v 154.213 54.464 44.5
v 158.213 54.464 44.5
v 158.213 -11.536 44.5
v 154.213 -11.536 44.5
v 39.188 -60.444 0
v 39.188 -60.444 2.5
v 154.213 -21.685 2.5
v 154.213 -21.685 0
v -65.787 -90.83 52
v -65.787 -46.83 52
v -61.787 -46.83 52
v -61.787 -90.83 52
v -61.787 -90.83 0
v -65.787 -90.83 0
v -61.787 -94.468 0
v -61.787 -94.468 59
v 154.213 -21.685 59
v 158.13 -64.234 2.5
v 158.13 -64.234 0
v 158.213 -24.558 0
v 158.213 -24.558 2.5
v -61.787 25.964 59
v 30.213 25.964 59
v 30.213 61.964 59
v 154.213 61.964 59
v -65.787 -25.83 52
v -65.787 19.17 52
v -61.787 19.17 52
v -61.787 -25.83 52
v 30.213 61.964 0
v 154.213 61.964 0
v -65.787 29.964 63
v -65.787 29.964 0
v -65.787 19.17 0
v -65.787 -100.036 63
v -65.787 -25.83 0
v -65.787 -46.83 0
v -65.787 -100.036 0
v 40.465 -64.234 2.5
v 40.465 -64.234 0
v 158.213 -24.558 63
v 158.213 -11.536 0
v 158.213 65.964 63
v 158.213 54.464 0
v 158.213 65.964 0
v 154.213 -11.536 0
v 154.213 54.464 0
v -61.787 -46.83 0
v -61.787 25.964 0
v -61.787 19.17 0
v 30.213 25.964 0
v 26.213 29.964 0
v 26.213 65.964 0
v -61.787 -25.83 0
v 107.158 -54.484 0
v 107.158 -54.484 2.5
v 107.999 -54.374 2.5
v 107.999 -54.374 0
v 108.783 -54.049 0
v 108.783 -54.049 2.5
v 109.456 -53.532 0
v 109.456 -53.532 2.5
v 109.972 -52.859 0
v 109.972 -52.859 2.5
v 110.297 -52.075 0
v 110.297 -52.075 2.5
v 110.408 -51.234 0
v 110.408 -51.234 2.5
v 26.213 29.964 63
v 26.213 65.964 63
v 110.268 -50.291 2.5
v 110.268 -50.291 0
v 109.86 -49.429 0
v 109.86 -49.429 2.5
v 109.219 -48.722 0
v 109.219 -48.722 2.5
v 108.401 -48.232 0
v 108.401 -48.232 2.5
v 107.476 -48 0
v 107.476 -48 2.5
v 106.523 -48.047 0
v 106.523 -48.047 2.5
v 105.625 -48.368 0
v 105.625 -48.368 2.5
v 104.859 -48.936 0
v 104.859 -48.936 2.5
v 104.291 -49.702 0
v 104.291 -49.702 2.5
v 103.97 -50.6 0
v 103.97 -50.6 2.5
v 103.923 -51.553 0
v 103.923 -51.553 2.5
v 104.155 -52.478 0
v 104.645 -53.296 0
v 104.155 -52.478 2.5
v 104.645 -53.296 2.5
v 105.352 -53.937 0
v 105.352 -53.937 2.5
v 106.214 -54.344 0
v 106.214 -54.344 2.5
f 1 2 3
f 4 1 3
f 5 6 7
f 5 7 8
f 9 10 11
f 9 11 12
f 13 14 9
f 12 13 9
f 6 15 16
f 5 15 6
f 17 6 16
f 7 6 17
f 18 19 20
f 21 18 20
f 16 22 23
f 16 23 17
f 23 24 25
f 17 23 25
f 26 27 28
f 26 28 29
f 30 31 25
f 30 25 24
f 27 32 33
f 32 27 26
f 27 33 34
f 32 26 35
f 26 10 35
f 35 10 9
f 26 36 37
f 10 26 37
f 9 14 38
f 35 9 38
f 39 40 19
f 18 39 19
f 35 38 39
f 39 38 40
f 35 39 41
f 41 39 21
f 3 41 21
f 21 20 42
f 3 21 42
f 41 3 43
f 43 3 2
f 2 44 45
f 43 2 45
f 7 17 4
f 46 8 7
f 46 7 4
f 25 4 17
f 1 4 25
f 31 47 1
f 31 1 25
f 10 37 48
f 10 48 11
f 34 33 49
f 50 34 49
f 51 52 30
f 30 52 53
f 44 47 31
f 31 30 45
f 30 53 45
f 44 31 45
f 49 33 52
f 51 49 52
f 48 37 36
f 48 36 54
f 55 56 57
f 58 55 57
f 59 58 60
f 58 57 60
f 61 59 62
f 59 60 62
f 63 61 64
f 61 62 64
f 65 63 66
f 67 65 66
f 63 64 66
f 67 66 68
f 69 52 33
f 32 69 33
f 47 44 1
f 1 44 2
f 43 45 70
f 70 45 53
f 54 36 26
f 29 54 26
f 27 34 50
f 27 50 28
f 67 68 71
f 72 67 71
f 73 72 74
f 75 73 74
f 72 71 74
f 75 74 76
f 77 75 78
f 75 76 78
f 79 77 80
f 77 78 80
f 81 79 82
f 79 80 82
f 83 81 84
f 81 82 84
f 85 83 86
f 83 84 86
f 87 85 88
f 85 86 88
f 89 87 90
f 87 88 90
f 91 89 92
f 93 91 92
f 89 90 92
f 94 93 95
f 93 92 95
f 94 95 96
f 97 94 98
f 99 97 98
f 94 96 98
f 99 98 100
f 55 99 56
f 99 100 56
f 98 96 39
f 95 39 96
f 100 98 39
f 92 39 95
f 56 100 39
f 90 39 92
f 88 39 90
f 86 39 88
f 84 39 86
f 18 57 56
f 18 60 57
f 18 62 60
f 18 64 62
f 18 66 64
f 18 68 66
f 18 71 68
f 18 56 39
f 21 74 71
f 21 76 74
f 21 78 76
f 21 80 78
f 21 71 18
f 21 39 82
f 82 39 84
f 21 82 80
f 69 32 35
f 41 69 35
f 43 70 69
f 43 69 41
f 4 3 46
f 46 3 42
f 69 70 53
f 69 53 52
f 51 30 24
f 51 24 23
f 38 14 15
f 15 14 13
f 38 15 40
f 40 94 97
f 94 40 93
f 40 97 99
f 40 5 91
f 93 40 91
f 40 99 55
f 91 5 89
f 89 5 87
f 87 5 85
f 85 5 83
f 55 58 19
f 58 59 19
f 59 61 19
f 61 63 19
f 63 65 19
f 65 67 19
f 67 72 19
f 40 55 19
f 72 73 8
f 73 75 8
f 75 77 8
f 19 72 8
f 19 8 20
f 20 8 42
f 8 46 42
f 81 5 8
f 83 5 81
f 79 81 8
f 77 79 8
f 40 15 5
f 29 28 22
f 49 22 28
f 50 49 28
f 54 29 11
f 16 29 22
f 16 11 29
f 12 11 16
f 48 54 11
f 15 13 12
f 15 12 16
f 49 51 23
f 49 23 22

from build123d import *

# Parameters (mm, degrees)
F1_DEPTH    = 63
F2_DEPTH    = 2.5
F3_T        = 4
F3_T3_DEPTH = 132.2533825366
F3_T5_DEPTH = 10.5
F3_T7_DEPTH = 71
F4_W        = 44
F4_H        = 52
F4_W_2      = 45
F5_DEPTH    = 4.5
F7_DEPTH    = 5
F9_DEPTH    = 25


# Not quite as in the source:
# - a shell that OpenCascade refuses in one call is made with other operations: the cavity is built on its own and cut out


with BuildPart() as f1:
    # F0 (on Top) → F1 (new body)
    with BuildSketch(Plane.XY):
        Polygon((26.2132732272, -24.0364130735), (26.2132732272, 29.9635869265), (-65.7867267728, 29.9635869265), (-65.7867267728, -100.0364130735), (26.2132732272, -69.0364130735), align=None)
        Polygon((158.2132732272, 65.9635869265), (26.2132732272, 65.9635869265), (26.2132732272, 29.9635869265), (26.2132732272, -24.0364130735), (26.2132732272, -69.0364130735), (40.4647773284, -64.234275822), (158.2132732272, -24.558152204), align=None)
    extrude(amount=F1_DEPTH)

    # F0 (on Top) → F2 (join)
    with BuildSketch(Plane.XY):
        Polygon((158.2132732272, 65.9635869265), (26.2132732272, 65.9635869265), (26.2132732272, 29.9635869265), (26.2132732272, -24.0364130735), (26.2132732272, -69.0364130735), (40.4647773284, -64.234275822), (158.2132732272, -24.558152204), align=None)
        Polygon((26.2132732272, -24.0364130735), (26.2132732272, 29.9635869265), (-65.7867267728, 29.9635869265), (-65.7867267728, -100.0364130735), (26.2132732272, -69.0364130735), align=None)
        Polygon((158.1303410754, -64.234275822), (158.2132732272, -24.558152204), (40.4647773284, -64.234275822), align=None)
    extrude(amount=F2_DEPTH)

    # F3: shell of thickness 4, made by hand


with BuildPart() as f3_core1:
    # F3_t2: copy of F1
    add(f1.part)

    # the walls: a layer under each face that stays
    f3_faces = [f3_core1.faces().sort_by_distance(p)[0] for p in [
        (46.2132732272, -62.2972826388, 31.5),
        (99.2975592019, -64.234275822, 1.25),
        (158.1718071513, -44.396214013, 1.25),
        (99.3390252778, -57.6215885524, 2.5),
        (158.2132732272, 20.7027173612, 31.5),
        (92.2132732272, 65.9635869265, 31.5),
        (26.2132732272, 47.9635869265, 31.5),
        (-19.7867267728, 29.9635869265, 31.5),
        (46.2132732272, -17.0364130735, 63),
        (-65.7867267728, -35.0364130735, 31.5),
    ]]
    thicken(f3_faces, amount=-F3_T, mode=Mode.SUBTRACT)

    # F3_s4 → F3_t3 (cut)
    with BuildSketch(Plane(origin=(13.1110220732, 4.4178443942, 0), x_dir=(0, 0, 1), z_dir=(0.9476482128, 0.3193162456, 0))):
        Polygon((2.54, 73.8325574618), (2.5, 69.7925574618), (-1.5, 69.7925574618), (-1.5, 73.7925574618), align=None)
    extrude(amount=F3_T3_DEPTH, mode=Mode.SUBTRACT)

    # F3_s6 → F3_t5 (cut)
    with BuildSketch(Plane.XY.offset(-4)):
        Polygon((40.4775499783, -64.3121817506), (39.1875123459, -60.4436829707), (39.8089787227, -60.234275822), (40.4647773284, -60.234275822), align=None)
    extrude(amount=F3_T5_DEPTH, mode=Mode.SUBTRACT)

    # F3_s8 → F3_t7 (cut)
    with BuildSketch(Plane.XY.offset(-4)):
        Polygon((26.1732732272, 30.0035869265), (30.2132732272, 29.9635869265), (30.2132732272, 25.9635869265), (26.2132732272, 25.9635869265), align=None)
    extrude(amount=F3_T7_DEPTH, mode=Mode.SUBTRACT)


with BuildPart() as f1_1:
    add(f1.part)

    # what is left inside the walls is the cavity
    f3_cavity = [f3_core1.part.solids().sort_by_distance(p)[0] for p in [
        (46.213273, -42.323879, 0.04),
    ]]
    add(f3_cavity, mode=Mode.SUBTRACT)

    # F4 (on face) → F5 (cut)
    with BuildSketch(Plane(origin=(-65.7867267728, 0, 0), x_dir=(0, -1, 0), z_dir=(-1, 0, 0))):
        with Locations((68.8298759162, 26)):
            Rectangle(F4_W, F4_H)
        with Locations((3.3298759162, 26)):
            Rectangle(F4_W_2, F4_H)
    extrude(amount=-F5_DEPTH, mode=Mode.SUBTRACT)

    # F6 (on face) → F7 (cut)
    with BuildSketch(Plane.YZ.offset(158.2132732272)):
        Polygon((36.0559523106, 44.5), (-11.5364130735, 44.5), (-11.5364130735, 0), (54.4635869265, 0), (54.4635869265, 44.5), align=None)
    extrude(amount=-F7_DEPTH, mode=Mode.SUBTRACT)

    # F8 (on face) → F9 (cut)
    with BuildSketch(Plane.XY.offset(2.5)):
        with BuildLine():
            ThreePointArc((107.1575140418, -54.484275822), (109.4556110807, -53.5323728609), (110.4075140418, -51.234275822))
            Line((110.4075140418, -51.234275822), (107.1575140418, -51.234275822))
            Line((107.1575140418, -51.234275822), (107.1575140418, -54.484275822))
        make_face()
        with BuildLine():
            Line((107.1575140418, -51.234275822), (110.4075140418, -51.234275822))
            ThreePointArc((110.4075140418, -51.234275822), (104.859417003, -48.9361787832), (107.1575140418, -54.484275822))
            Line((107.1575140418, -54.484275822), (107.1575140418, -51.234275822))
        make_face()
    extrude(amount=-F9_DEPTH, mode=Mode.SUBTRACT)


solid = f1_1.part
